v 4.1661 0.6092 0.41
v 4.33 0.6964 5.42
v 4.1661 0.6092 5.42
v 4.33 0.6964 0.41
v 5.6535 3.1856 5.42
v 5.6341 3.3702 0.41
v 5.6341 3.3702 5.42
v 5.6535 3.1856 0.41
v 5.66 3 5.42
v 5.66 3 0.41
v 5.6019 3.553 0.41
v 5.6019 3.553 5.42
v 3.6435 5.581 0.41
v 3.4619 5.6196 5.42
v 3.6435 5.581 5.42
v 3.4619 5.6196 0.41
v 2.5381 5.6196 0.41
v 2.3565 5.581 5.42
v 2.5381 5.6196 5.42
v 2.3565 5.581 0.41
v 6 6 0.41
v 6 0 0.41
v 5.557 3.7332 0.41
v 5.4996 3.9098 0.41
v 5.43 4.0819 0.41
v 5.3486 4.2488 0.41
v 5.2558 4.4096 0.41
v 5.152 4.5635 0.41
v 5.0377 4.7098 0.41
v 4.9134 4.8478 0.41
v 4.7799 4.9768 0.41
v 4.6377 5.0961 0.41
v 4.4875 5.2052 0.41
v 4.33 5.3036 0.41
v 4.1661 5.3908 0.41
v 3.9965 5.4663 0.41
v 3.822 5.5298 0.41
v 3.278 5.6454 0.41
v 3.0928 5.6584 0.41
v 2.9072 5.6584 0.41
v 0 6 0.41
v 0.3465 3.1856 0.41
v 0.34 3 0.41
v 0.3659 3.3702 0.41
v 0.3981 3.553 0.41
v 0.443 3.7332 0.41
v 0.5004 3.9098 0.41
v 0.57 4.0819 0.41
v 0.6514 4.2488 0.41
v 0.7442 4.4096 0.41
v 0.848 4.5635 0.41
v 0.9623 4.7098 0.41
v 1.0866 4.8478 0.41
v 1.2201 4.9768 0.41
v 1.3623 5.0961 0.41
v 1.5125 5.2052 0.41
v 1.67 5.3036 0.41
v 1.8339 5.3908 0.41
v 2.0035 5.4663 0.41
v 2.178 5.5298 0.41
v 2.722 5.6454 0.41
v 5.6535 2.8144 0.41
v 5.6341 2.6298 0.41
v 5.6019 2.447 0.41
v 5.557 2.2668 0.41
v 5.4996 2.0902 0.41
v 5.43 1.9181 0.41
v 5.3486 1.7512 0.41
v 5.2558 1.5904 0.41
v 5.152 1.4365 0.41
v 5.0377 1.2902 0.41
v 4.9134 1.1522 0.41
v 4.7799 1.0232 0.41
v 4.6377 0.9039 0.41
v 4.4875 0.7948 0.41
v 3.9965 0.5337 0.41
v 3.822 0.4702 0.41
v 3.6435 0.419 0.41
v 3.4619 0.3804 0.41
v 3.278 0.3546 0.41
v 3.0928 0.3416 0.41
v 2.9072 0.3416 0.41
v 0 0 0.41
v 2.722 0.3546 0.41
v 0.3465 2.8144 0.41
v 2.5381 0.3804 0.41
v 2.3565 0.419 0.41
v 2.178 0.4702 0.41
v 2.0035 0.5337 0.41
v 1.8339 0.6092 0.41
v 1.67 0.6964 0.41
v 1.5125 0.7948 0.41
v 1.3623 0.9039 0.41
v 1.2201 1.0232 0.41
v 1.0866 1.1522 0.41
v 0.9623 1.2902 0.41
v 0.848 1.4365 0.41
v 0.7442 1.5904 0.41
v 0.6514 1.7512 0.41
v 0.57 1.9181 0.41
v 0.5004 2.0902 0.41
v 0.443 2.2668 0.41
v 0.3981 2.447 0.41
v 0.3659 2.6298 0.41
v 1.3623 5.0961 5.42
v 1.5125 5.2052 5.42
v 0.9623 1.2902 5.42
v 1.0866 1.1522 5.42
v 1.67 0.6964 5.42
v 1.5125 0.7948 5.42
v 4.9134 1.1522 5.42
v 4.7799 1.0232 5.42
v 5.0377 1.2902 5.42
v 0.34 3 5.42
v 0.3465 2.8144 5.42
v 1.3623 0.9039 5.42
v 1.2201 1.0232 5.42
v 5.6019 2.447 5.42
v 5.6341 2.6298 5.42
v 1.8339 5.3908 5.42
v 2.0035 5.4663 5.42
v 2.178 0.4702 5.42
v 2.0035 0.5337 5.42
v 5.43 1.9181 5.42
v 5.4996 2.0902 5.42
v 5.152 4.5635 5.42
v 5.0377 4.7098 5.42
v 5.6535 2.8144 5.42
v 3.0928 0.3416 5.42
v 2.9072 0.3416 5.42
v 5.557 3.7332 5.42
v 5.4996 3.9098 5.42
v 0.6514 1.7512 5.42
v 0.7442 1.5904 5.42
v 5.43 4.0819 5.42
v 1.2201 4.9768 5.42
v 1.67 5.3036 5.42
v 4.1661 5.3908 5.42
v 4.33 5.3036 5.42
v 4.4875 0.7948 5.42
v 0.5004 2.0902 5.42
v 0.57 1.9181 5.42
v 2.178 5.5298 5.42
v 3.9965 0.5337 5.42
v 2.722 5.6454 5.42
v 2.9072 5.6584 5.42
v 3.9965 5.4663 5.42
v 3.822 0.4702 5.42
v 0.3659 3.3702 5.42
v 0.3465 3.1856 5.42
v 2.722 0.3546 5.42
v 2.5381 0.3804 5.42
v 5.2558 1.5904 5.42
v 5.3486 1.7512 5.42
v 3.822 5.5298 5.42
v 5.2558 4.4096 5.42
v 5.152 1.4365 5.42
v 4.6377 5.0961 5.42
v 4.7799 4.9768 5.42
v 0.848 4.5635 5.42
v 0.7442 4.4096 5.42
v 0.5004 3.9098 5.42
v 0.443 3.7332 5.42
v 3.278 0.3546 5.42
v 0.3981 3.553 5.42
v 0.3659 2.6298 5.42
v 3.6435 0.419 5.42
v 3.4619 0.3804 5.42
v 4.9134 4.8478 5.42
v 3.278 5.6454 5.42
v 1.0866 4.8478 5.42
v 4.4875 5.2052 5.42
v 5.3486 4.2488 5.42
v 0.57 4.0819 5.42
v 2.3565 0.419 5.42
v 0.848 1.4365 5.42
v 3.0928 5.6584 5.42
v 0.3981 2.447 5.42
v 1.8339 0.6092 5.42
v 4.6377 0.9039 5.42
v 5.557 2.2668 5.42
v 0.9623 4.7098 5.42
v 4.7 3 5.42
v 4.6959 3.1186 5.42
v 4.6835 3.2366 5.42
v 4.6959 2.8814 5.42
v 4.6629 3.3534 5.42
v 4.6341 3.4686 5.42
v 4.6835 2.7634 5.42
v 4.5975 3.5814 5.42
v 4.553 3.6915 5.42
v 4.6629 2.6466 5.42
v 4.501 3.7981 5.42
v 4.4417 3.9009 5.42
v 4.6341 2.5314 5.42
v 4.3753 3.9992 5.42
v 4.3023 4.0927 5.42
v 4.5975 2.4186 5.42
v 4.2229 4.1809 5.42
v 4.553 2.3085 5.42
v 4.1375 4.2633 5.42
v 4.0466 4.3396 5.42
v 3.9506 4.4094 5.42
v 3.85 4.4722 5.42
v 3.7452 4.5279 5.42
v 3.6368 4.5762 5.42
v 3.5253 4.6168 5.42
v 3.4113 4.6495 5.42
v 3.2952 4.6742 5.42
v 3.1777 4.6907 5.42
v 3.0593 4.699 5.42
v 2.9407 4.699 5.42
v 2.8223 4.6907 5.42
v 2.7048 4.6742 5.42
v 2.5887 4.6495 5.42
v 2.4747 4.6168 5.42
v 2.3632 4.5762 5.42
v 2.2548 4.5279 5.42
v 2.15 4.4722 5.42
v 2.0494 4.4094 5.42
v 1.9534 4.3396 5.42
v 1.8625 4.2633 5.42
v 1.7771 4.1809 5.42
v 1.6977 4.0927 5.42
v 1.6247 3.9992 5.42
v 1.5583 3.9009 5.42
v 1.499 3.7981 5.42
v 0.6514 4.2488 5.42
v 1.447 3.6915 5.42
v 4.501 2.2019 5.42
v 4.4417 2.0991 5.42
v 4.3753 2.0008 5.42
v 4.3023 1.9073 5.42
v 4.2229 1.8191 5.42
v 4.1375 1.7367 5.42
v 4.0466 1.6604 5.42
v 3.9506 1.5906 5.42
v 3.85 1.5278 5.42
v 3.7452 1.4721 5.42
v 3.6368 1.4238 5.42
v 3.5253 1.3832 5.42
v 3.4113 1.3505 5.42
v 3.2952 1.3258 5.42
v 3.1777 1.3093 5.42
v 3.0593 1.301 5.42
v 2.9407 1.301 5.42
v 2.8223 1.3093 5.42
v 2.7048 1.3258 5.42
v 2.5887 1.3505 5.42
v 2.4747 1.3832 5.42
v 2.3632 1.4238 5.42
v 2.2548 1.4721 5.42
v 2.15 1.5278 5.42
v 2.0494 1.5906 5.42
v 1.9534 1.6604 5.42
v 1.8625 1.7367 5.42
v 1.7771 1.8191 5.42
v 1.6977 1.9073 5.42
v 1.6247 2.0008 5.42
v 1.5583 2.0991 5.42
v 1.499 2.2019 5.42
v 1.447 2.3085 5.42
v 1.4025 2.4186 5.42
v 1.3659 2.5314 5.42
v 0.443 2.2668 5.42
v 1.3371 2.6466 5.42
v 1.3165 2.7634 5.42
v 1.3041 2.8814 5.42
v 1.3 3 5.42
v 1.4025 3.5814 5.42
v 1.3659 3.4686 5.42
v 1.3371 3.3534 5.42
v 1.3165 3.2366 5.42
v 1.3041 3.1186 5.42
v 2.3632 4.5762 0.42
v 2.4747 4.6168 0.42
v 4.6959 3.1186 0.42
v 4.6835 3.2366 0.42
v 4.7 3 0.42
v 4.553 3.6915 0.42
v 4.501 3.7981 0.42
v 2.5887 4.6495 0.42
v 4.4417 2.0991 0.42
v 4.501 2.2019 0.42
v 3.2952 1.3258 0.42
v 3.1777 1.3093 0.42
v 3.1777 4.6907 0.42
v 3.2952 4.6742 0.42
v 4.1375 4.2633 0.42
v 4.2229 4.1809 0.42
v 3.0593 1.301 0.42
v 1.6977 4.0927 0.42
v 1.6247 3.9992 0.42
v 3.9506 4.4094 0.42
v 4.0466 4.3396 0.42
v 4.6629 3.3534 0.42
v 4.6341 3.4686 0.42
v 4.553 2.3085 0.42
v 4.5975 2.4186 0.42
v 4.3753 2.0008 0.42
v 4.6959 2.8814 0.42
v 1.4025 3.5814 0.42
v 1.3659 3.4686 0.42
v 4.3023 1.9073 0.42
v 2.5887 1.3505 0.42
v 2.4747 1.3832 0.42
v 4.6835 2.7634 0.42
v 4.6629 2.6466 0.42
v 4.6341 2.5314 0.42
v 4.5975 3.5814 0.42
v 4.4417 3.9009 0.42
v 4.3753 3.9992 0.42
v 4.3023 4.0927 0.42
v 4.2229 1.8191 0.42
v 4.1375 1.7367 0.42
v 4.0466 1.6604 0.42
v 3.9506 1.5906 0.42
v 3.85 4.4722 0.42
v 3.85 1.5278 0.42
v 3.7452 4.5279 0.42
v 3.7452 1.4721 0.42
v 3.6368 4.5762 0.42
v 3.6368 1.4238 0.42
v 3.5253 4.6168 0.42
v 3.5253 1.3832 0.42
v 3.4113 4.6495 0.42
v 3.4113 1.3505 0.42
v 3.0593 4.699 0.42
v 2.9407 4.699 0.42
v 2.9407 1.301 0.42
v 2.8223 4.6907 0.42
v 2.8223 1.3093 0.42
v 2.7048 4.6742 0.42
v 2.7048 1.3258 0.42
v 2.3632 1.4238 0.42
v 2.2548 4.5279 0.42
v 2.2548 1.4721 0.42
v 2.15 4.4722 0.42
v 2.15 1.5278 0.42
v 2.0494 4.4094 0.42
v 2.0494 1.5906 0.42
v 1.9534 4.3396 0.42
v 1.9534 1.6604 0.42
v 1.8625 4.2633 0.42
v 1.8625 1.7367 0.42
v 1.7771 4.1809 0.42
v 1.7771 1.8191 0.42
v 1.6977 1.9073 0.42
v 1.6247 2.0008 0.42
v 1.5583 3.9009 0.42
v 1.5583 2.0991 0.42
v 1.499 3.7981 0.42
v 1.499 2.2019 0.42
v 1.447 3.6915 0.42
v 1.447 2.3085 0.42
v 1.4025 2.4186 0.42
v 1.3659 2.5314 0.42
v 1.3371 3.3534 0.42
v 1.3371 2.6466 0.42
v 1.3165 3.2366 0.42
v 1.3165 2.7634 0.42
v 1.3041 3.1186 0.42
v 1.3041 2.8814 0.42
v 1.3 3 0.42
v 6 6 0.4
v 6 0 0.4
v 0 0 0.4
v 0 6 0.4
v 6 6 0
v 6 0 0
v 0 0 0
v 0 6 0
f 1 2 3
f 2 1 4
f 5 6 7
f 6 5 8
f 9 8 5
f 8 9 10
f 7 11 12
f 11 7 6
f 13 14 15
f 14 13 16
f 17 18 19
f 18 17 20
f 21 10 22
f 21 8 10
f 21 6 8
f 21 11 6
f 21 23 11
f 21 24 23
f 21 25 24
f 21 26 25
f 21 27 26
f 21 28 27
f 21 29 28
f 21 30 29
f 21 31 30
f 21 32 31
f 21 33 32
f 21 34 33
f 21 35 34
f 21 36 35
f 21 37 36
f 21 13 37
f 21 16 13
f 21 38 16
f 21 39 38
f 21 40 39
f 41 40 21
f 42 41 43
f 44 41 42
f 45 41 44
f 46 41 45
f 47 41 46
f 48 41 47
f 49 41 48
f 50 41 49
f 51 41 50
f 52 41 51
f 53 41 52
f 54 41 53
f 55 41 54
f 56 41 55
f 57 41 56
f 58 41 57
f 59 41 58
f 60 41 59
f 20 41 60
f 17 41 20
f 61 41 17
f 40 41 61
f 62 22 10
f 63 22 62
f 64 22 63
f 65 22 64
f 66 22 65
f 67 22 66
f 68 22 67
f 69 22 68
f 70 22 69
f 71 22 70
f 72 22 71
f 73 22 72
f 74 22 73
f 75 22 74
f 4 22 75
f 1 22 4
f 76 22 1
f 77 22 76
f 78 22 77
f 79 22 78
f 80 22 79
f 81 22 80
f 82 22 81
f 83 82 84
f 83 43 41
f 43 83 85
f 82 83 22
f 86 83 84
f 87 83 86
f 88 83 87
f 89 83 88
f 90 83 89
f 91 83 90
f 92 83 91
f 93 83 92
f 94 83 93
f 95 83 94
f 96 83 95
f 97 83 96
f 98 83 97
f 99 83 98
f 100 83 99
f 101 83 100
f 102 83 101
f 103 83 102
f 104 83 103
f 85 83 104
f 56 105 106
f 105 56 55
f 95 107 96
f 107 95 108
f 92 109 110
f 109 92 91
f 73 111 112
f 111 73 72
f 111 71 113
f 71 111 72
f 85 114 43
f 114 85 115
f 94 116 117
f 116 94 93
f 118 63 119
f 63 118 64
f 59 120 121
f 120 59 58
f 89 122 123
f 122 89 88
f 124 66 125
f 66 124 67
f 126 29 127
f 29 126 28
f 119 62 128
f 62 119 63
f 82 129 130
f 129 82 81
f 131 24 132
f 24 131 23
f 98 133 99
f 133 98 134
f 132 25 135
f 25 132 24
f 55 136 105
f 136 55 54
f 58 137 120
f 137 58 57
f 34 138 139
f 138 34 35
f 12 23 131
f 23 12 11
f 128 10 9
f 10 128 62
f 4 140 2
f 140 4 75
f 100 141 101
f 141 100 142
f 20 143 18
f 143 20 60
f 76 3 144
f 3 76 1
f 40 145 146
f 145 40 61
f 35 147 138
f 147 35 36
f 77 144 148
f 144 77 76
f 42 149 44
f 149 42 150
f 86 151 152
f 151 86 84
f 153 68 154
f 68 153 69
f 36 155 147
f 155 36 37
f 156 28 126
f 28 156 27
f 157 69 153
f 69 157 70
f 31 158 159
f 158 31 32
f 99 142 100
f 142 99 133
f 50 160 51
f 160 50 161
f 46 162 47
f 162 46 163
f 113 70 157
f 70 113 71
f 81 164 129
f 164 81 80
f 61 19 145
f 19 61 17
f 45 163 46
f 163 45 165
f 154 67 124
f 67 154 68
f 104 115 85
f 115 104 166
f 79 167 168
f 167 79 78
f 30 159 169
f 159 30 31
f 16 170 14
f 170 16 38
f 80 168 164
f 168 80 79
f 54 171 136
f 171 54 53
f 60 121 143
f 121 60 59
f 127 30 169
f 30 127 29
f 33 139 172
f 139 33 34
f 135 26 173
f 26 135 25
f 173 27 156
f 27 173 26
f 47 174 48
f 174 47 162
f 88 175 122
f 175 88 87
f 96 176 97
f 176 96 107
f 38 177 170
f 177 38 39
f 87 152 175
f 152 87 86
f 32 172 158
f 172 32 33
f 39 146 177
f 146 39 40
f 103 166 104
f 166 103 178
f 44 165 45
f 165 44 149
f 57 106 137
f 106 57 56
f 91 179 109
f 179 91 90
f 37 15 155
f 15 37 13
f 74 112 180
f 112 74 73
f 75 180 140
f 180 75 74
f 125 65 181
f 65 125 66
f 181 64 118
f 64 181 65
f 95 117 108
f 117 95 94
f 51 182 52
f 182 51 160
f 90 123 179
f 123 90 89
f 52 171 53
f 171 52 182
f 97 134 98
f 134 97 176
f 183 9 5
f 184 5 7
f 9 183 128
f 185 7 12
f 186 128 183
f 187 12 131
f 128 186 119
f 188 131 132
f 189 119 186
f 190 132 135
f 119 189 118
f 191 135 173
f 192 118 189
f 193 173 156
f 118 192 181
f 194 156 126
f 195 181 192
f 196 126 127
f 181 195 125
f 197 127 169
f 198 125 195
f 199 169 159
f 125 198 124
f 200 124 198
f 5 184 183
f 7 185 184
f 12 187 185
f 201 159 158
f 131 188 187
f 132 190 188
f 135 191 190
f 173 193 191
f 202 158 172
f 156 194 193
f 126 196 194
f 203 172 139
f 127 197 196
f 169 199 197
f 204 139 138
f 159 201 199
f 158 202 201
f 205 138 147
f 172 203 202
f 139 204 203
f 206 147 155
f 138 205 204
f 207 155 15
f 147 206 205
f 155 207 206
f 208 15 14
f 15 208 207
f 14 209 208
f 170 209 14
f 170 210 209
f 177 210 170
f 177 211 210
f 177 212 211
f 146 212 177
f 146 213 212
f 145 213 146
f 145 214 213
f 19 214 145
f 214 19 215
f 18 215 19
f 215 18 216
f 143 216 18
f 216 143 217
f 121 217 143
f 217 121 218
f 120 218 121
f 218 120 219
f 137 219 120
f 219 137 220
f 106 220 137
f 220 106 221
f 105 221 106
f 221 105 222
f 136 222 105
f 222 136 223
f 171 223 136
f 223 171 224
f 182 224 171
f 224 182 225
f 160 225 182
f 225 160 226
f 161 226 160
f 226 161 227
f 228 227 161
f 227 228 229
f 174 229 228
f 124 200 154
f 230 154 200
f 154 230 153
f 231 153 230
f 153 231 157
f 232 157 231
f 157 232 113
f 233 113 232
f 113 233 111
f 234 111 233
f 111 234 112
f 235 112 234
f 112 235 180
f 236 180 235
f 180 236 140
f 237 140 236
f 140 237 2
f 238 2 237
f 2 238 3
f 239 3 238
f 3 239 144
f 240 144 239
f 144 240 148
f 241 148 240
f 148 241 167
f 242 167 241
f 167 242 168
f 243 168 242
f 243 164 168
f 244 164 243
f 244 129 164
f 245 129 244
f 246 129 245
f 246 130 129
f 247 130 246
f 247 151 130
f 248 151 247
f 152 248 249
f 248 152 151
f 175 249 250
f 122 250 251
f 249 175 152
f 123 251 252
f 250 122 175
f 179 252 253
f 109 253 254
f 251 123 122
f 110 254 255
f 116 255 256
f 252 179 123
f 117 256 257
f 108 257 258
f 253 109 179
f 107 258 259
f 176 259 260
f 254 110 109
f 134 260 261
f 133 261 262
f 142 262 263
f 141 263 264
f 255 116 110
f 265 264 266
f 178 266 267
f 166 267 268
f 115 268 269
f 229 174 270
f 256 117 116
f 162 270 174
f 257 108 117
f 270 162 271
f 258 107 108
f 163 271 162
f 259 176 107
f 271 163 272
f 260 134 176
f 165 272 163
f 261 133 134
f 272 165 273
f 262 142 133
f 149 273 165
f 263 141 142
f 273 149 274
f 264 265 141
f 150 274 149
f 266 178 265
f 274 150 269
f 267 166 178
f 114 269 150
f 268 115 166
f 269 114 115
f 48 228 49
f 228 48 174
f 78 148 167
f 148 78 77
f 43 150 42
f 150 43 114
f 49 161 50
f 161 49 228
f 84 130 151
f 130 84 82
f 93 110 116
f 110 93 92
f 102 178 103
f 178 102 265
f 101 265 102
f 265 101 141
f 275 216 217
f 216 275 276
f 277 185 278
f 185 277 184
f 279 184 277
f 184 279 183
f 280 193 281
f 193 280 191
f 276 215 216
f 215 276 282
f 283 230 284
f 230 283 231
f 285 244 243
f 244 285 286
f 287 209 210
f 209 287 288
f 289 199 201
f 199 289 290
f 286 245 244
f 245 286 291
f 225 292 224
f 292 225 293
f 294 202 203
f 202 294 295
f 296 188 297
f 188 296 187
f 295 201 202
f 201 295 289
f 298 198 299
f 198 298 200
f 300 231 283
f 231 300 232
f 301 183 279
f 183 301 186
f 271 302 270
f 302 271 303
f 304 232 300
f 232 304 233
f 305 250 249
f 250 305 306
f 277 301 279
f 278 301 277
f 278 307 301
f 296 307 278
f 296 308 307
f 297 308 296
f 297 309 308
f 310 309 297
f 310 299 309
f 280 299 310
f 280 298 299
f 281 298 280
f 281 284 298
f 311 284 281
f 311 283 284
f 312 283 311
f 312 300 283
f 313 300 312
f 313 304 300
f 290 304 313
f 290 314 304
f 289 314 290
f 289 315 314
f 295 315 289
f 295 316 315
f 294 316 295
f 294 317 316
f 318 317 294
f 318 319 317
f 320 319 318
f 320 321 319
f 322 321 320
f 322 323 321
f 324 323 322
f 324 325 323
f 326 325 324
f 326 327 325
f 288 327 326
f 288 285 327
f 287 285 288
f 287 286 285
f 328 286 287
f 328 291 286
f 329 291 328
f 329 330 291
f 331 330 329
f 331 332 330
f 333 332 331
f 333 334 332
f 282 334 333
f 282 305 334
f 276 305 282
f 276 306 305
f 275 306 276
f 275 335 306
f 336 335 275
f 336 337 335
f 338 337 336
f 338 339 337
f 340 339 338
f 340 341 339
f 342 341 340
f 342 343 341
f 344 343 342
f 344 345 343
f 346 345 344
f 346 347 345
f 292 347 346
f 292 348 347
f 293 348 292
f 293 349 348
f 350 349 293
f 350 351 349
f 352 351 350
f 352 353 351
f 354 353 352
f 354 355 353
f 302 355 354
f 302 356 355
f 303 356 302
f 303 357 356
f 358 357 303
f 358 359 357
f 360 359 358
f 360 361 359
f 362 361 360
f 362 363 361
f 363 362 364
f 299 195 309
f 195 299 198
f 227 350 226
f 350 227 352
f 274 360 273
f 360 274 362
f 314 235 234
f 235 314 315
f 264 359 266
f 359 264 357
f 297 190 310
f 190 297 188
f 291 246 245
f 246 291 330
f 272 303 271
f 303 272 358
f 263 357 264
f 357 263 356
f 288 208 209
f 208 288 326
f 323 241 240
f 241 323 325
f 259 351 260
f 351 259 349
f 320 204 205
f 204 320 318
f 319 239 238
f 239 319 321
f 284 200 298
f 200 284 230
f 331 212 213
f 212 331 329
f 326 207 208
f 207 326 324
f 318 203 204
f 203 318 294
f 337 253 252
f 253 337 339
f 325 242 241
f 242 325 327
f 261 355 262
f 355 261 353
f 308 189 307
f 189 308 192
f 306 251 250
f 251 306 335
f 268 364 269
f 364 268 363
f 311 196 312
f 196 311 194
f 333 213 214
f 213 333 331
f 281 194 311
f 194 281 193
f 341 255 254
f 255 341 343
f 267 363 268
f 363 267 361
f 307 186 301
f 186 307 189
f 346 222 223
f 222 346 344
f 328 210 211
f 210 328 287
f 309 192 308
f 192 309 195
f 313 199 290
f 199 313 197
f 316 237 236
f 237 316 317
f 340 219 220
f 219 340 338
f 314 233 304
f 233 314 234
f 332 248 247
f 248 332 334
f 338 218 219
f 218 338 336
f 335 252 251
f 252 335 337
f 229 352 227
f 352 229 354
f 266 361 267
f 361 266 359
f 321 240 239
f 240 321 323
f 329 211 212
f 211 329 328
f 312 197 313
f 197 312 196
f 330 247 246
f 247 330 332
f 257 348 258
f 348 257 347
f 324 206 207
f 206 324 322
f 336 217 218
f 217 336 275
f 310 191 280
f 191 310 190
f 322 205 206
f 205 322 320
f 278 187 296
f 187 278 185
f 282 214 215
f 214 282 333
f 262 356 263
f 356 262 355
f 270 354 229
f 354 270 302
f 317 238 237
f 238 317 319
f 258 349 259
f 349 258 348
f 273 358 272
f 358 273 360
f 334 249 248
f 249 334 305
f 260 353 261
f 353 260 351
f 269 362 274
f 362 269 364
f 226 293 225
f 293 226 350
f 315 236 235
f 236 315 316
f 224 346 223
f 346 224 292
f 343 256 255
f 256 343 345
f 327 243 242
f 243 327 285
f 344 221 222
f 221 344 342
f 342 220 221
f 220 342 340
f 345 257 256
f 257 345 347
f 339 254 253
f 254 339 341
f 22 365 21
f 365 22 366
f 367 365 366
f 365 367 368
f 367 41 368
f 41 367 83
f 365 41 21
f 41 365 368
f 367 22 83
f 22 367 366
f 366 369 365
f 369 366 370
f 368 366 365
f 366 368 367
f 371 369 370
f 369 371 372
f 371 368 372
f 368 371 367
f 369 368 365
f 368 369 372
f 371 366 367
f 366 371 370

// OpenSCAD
// file: ../../Base/PlacementOptions.scad
// Fischertechnik Box Foundation
// Placement Options

// Alignment
NoAlign = 0;
AlignLeft = 1;
AlignBottom = 2;
AlignCenter = 3;
AlignRight = 4;
AlignTop = 5;

// Element rotation degree steps
rotations = [0, -90, -180, -270];

// Rotation
NoRotation = 0;
Rotate0 = 0;
Rotate90 = 1;
Rotate180 = 2;
Rotate270 = 3;

// Docking (seen from above)
NoDock = -1;
DockLeft = 0;
DockTop = 1;
DockRight = 2;
DockCorner = 2;
DockBottom = 3;

// Web corners
LowerLeft = 0;
UpperLeft = 1;
UpperRight = 2;
LowerRight = 3;

// Web position relative to corner
LeftOfCorner = 0;
RightOfCorner = 1;
// file: ../../Base/Boxes.scad
// Fischertechnik Box Foundation
// Pre-designed Boxes

use <Constants.scad>

include <PlacementOptions.scad>

box190Width = 190;
box190Depth = 130;
box130Width = 130;
box130Depth = 95;

// Values are from an original ec3 box
topBottomDifference = 1.5;
outerHeight = 40;
baseThickness = 1.8;
innerHeight = outerHeight - baseThickness;
stackExcess = 5.7;
radius = 3.5;
wallThickness = 1.5;
tolerance = 0.2;

boxWallThickness = wallThickness;
boxBaseThickness = baseThickness;
boxWebWidth = 3.0;

// getBoxWallThickness()
// Gets the wall thickness of a Fischertechnik Box
function getBoxWallThickness() = boxWallThickness;

// getBoxUsageHeight(height = 38.2)
// Gets the usable height of a Fischertechnik box
// height = Outer height of the box from the bottom to the upper edge.
function getBoxUsageHeight(height = outerHeight) = height - baseThickness - stackExcess;

// getBoxInnerHeight()
// Gets the inner height of a Fischertechnik box, including the stack excess
function getBoxInnerHeight() = innerHeight;

// getBoxBaseThickness()
// Gets the thickness of the Fischertechnik box base.
function getBoxBaseThickness() = boxBaseThickness;

// getBoxWebWidth()
// Gets the width of a box web
function getBoxWebWidth() = boxWebWidth;

// getBox190Space()
// Gets the usable inner space of a Box 190 as an x/y-list
function getBox190Space() = [
    box190Width - 2*getBoxWallThickness() - topBottomDifference, 
    box190Depth - 2*getBoxWallThickness() - topBottomDifference ];

// RoundedCornerPlate(width, depth, height, radius)
// Creates a body plate with rounded corners for a box. Used
// also to create the complete box with the hull module.
// width = Width of the plate
// depth = depth of the plate 
// height = thickness of the plate
// radius = radius of the rounded corner
module RoundedCornerPlate(width, depth, height, radius) {
    translate([radius, radius])
    hull() {
        w = width-2*radius;
        d = depth-2*radius;
        cube([w, d, height]);
        cylinder(height, r=radius, $fn=getFragments());
        translate([w, 0])
            cylinder(height, r=radius, $fn=getFragments());
        translate([w, d])
            cylinder(height, r=radius, $fn=getFragments());
        translate([0, d])
            cylinder(height, r=radius, $fn=getFragments());
    }
}

// BoxBase(width, depth)
// Creates an empty stackable Fischertechnik compatible box
// width = Outer width of the box (190, 130, ...)
// depth = Outer depth of the box (130, 95, ...)

module BoxBase(width, depth, height=outerHeight) {    
    thinPlate = 0.01;

    innerHeight = height - baseThickness;    
    
    module Body(tolerance=tolerance) {
        hull() {
            // Bottom with tolerance to fit into the original boxes when stacked
            translate([-wallThickness+tolerance, -wallThickness+tolerance, -baseThickness])
                RoundedCornerPlate(width-topBottomDifference-2*tolerance, depth-topBottomDifference-2*tolerance, thinPlate, radius);
            
            // Top
            translate([-wallThickness-topBottomDifference/2, -wallThickness-topBottomDifference/2, innerHeight-thinPlate])
                RoundedCornerPlate(width, depth, thinPlate, radius);
         }
    }

    module Cutoff() {
        hull() {
            coWidth = width - 2*wallThickness;
            coDepth = depth - 2*wallThickness;
            
            // Bottom
            RoundedCornerPlate(coWidth-topBottomDifference, coDepth-topBottomDifference, thinPlate, radius);

            // Top
            translate([-topBottomDifference/2, -topBottomDifference/2, innerHeight+thinPlate]) 
                RoundedCornerPlate(coWidth, coDepth, thinPlate, radius);
        }
    }
    
    difference() {        
        Body();
        Cutoff();
        stackOffset = innerHeight - stackExcess;
        translate([0, 0, stackOffset + baseThickness])
            Body(tolerance=0);
    }
}

// Creates the Fischertechnik empty box 130x190 mm and places it at position 0,0
// 190x130 are the outer sizes, the inner space is slightly smaller. Use getBox190Space() to get the inner sizes.
// The box is positioned that the usable inner space is at the 0,0,0 position.

module Box190() {
    BoxBase(box190Width, box190Depth);
}

// Gets the usable inner space of a Box 130 as an x/y-list
function getBox130Space() = [
    box130Width - 2*getBoxWallThickness() - topBottomDifference, 
    box130Depth - 2*getBoxWallThickness() - topBottomDifference ];

// Creates the Fischertechnik empty box 95x130 mm and places it at position 0,0
// 190x130 are the outer sizes, the inner space is slightly smaller. Use getBox190Space() to get the inner sizes.
// The box is positioned that the usable inner space is at the 0,0,0 position.

module Box130() {
    BoxBase(box130Width, box130Depth);
}

// Creates a web at the specified box walls
// corner 0 = LowerLeft, 1 = UpperLeft, 2 = UpperRight, 3 = LowerRight
// side 0 = LeftOfCorner, 1 = RightOfCorner
// distance = Distance in mm from the corner
// boxSpace = inner width and depth of the box (default: Box 190)
// webWidth = length of the web (default is 3 mms)
// webThickness = thickness of the web (default is 1 mm)
// height = Height of the web (standard is getBoxUsageHeight())
// sink = How much of the web is sunk into the wall

module BoxWeb(
    corner, 
    side, 
    distance, 
    boxSpace=getBox190Space(), 
    webWidth=getBoxWebWidth(), 
    webThickness=1.0, 
    height=getBoxUsageHeight(),
    sink = getBoxWallThickness()/2) {
    width = (corner % 2 == 0) ? 
            (side == LeftOfCorner ? webWidth : webThickness) :
            (side == LeftOfCorner ? webThickness : webWidth);

    depth = (corner % 2 == 0) ? 
            (side == RightOfCorner ? webWidth : webThickness) :
            (side == RightOfCorner ? webThickness : webWidth);
    
    xDiff = corner == LowerLeft ? 
                (side == LeftOfCorner ? -sink : distance) :
            (corner == UpperLeft ?                
                (side == LeftOfCorner ? distance : -sink) :
            (corner == UpperRight ?
                (side == LeftOfCorner ? boxSpace.x-webWidth+sink : boxSpace.x-distance-webThickness) :
                (side == LeftOfCorner ? boxSpace.x-distance-webThickness: boxSpace.x-webWidth+sink)));

    yDiff = corner == LowerLeft ? 
                (side == RightOfCorner ? -sink : distance) :
            (corner == UpperLeft ?
                (side == RightOfCorner ? boxSpace.y-distance-webThickness : boxSpace.y-webWidth+sink) :
            (corner == UpperRight ?
                (side == RightOfCorner ? boxSpace.y-webWidth+sink : boxSpace.y-distance-webThickness) :
                (side == RightOfCorner ? distance : -sink)));
    
    translate([xDiff, yDiff, -getExcess()])
        cube([width, depth, height + 2*getExcess()]);
}
// file: ../../Base/Rotation.scad
// Fischertechnik Box Foundation
// Geometry Helpers Rotation

include <PlacementOptions.scad>

// getRotatedSpace(space, rotation=NoRotation)
// Rotates the space dependent on the specified rotation

function getRotatedSpace(space, rotation=NoRotation) = [
    (rotation == Rotate90 || rotation == Rotate270) ? space.y : space.x,
    (rotation == Rotate90 || rotation == Rotate270) ? space.x : space.y
];

// Rotates the given space around the fixed left lower corner
// space = the space the children needs as width/depth list [width,depth]
// rotation = 0 Rotate0 degrees, 1 Rotate90 degrees, 2 Rotate180 degrees, 3 Rotate270 degrees (equivalent to -90)

module RotateFix(space, rotation=NoRotation) {
    dy = (rotation == Rotate0 || rotation == Rotate270) ? 0 :
        (rotation == Rotate90) ? space.x :
        space.y;
    dx = (rotation < Rotate180) ? 0 :
        (rotation == Rotate180) ? space.x :
        space.y;
    
    translate([dx, dy, 0])
        rotate([0, 0, rotations[rotation]])
            children();
}
// file: ../../Base/Alignment.scad
// Fischertechnik Box Foundation
// Geometry Helpers Alignment

include <PlacementOptions.scad>

// getAlignedX(elementWidth, spaceWidth, align=AlignRight, offset=0)
// Gets the aligned X offset of an element with the given
// width in the given space.
// elementWidth = The width of the element to positon
// spaceWidth = The space where the element should be aligned
// align = 0 AlignLeft, 1 AlignCenter, 2 AlignRight
// offset = an optional offset from the aligned position. When
// aligned left or centered, then positive values are in X direction.
// When aligned right then positive values are in negative X direction.

function getAlignedX(elementWidth, spaceWidth, align=AlignRight, offset=0) =
    (align == AlignLeft) ?
        offset :
        ((align == AlignCenter) ?
        (spaceWidth - elementWidth)/2 + offset :
        spaceWidth - offset - elementWidth);

// getAlignedY(elementDepth, spaceDepth, align=AlignTop, offset=0)
// Gets the aligned Y offset of an element with the given
// depth in the given space.
// elementDepth = The depth of the element to positon
// spaceDepth = The space where the element should be aligned
// align = 0 AlignBottom, 1 AlignCenter, 2 AlignTop
// offset = an optional offset from the aligned position. When
// aligned bottom or centered, then positive values are in Y direction.
// When aligned top then positive values are in negative Y direction.

function getAlignedY(elementDepth, spaceDepth, align=AlignTop, offset=0) =
    (align == AlignBottom) ?
        offset :
        ((align == AlignCenter) ?
        (spaceDepth - elementDepth)/2 + offset :
        spaceDepth - offset - elementDepth);
// file: ../../Base/Placement.scad
// Fischertechnik Box Foundation
// Geometry Helpers Placement

use <Constants.scad>
use <Alignment.scad>
use <Rotation.scad>
use <Boxes.scad>

include <PlacementOptions.scad>

// Place(x=0, y=0, elementSpace=[0,0], alignX=AlignLeft, alignY=AlignBottom, rotation=Rotate0, boxSpace=getBox190Space())
// Places the child at the specified position
// y = Y-Position. This is a relative position when an X aligment is specified.
// x = X-Position. This is a relative position when an Y aligment is specified.
// elementSpace = space of the element to be placed [x,y]
// alignX = -1=NoAlign, 0 AlignLeft, 1 AlignCenter, 3 AlignRight (elementSpace and boxSpace required!)
// alignY = -1=NoAlign, 2 AlignBottom, 1 AlignCenter, 4 AlignTop (elementSpace and boxSpace required!)
// rotation = 0 Rotate0 0 degrees, 1 Rotate90 90 degrees, 
// 2 Rotate180 180 degrees, 3 Rotate270 270 degrees (equivalent to -90)
// boxSpace = Inner space of the box where the placement occurs [x,y] - default is Box 190x130 inner space

module Place(x=0, y=0, elementSpace=[0,0], 
  alignX=AlignLeft, alignY=AlignBottom, 
  rotation=NoRotation, boxSpace=getBox190Space()) {

    module Position(x, y, space, rotation=Rotate0) {
        translate([x, y, 0])
            RotateFix(space, rotation)
                children();
    }

    space = getRotatedSpace(elementSpace, rotation);
    alignedX = getAlignedX(space.x, boxSpace.x, alignX, x);
    alignedY = getAlignedY(space.y, boxSpace.y, alignY, y);
    Position(alignedX, alignedY, elementSpace, rotation)
        children();
}

// Center(space=getBox130Space(), elementSpace=[0,0])
// space = Space where the children is centered. For cylinder use centered=true and no elementSpace.
// elementSpace = space of the element to be centered [x,y]

module Center(space=getBox190Space(), elementSpace=[0,0]) {
    Place(elementSpace=elementSpace, boxSpace=space, alignX=AlignCenter, alignY=AlignCenter)
        children();
}

// CenterHorizontal(width=0, y=0, offset=0, space=getBox130Space())
// width = Width of the element to be placed.
// y = Y position of the element
// offset = Offset from the center position (negative will be left of the center)
// space = Space where the element is placed

module CenterHorizontal(width=0, y=0, offset=0, space=getBox190Space()) {
    Place(x=offset, y=y, elementSpace=[width, 0], boxSpace=space, alignX=AlignCenter)
        children(0);
}

// CenterVertical(depth=0, x=0, offset=0, space=getBox130Space())
// depth = Depth of the element to be placed.
// x = X position of the element
// offset = Offset from the center position (negative will be down of the center)
// space = Space where the element is placed

module CenterVertical(depth=0, x=0, offset=0, space=getBox190Space()) {
    Place(x=x, y=offset, elementSpace=[0, depth], boxSpace=space, alignY=AlignCenter)
        children(0);
}

// getIsVertical(align)
// True if the specified alignment needs a vertical orientation for a divider (AlignRight, AlignLeft)

function getIsVertical(align) = (align == AlignRight || align == AlignLeft);

// getIsHorizontal(align)
// True if the specified alignment needs a horizontal orientation for a divider (AlignTop, AlignBottom)

function getIsHorizontal(align) = (align == AlignTop || align == AlignBottom);
// file: ../../Elements/AxisClip10.scad
// Fischertechnik Box Library
// Axis for clip 10
// 31023

use <../ModelBase/Simple.scad>
use <../Base/Constants.scad>

/* [Element Parameters] */
height = 23;
clipHeight = 10;

/* [Hidden] */
width = 12;
depth = 12;
upperDiameter = 3.6;

// getAxisClip10Space()
// Gets the space of a n axis for a clip 10 with spring ring (mot2)

function getAxisClip10Space() = [width, depth, height];

// AxisClip10(height, clipHeight)
// Axis for clip 10 with spring ring (mot2)
// height = Height of the complete axis (standard is 23, in mot3 its only 12)
// clipHeight = Height of the part for the clip (standard is 10, in mot3 its only 7)

module AxisClip10(height=height, clipHeight=clipHeight) {
    LeveledAxisWithSpace(height, height-clipHeight, getAxisClip10Space(), diameter=upperDiameter);
}

// Test
color("lightgray")
AxisClip10(height, clipHeight);
// file: ../../Base/Constants.scad
// Fischertechnik Box Foundation
// Constants

// Constant values necessary for multiple elements

// Base constants
dividerThickness = 1.2;
excess = 0.01;
fragments = 90;
tolerance = 0.8;

// Gets the thickness of a divider 
function getDividerThickness() = dividerThickness;

// Gets the excess that is used to merge walls into each other
function getExcess() = excess;

// Gets amount of fragments of a cylinder
function getFragments() = fragments;

// Gets the inner tolerance of a frame to each side
function getTolerance() = tolerance;


// Fischertechnik specific constants
axisDiameter = 4;
axisBottomDiameter = axisDiameter + 1;
axisTolerance = 0.2;

// Gets axis diameter of Fischertechnik axis
function getAxisDiameter() = axisDiameter;

// Gets axis diameter tolerance (subtracted for element axis)
function getAxisTolerance() = axisTolerance;

// Gets the axis diameter for standing axis
function getStandAxisDiameter() = getAxisDiameter() - getAxisTolerance();

// Gets axis bottom diameter for thicker part at the bottom
function getAxisBottomDiameter() = axisBottomDiameter;

pinHeight = 2.5;

// gets the height of a connecting pin
function getPinHeight() = pinHeight;

standardEdgeDistance = 2.5;
standardWebDistance = 11.5;
standardCornerLength = 15;

// gets the standard distance to the wall of the box for dockable frames with webs
function getStandardEdgeDistance() = standardEdgeDistance;

// gets the standard distance of each web to the corner of the dockable frame
function getStandardWebDistance() = standardWebDistance;

// gets the standard length of the corner walls of a dockable frame
function getStandardCornerLength() = standardCornerLength;

tubeWallFactor = 0.8;

// gets the wall thickness of a tube.
function getTubeWallThickness() = tubeWallFactor * getDividerThickness();

smallPartsFrameHeight = 20;

// gets the frame height for docked small parts boxes.
function getSmallPartsFrameHeight() = smallPartsFrameHeight;

hubRingDiameter = 19.5;
hubRingLevelDiameter = 21;

// gets the diameter of a tube matching the inner ring of a wheel
function getHubRingDiameter() = hubRingDiameter;

// gets the diameter of a hub tube with a thicker diameter
function getHubRingLevelDiameter() = hubRingLevelDiameter;
// file: ../../Elements/CylinderClipContact.scad
// Fischertechnik Box Library
// Cylinder for clip contact
// 31338

use <../Base/Constants.scad>
use <../Base/Placement.scad>
use <../ModelBase/Simple.scad>
use <../ModelBase/Complex.scad>

/* [Hidden] */
width = 6;
depth = 6;
height = 5;

// getCylinderClipContactSpace()
// Gets the space the cylinder for clip contact needs

function getCylinderClipContactSpace() = [width, depth, height];

// CylinderClipContact()
// Standing cylinder for clip contact (as in mini-mot 1)
// 31338

module CylinderClipContact() {
    Space(getCylinderClipContactSpace());
    
    innerDiameter = 3.4;
    Center(getCylinderClipContactSpace())
        Tube(height, innerDiameter=innerDiameter);
}

// Tests
color("lightgray")
CylinderClipContact();
// file: ../TestPrint.scad
// 3D Print Test Base

use <../Base/Constants.scad>

use <../Elements/AxisClip10.scad>

module TestPrint(elementSpace) {
    cube([elementSpace.x, elementSpace.y, 0.4]);
    translate([0,0,0.4+getExcess()]) {
        children();
    }
}

TestPrint(getAxisClip10Space())
    AxisClip10();
// main file
// 3D Print Test
// CylinderClipContact

use <../TestPrint.scad>
use <../../Elements/CylinderClipContact.scad>

TestPrint(getCylinderClipContactSpace())
    CylinderClipContact();
